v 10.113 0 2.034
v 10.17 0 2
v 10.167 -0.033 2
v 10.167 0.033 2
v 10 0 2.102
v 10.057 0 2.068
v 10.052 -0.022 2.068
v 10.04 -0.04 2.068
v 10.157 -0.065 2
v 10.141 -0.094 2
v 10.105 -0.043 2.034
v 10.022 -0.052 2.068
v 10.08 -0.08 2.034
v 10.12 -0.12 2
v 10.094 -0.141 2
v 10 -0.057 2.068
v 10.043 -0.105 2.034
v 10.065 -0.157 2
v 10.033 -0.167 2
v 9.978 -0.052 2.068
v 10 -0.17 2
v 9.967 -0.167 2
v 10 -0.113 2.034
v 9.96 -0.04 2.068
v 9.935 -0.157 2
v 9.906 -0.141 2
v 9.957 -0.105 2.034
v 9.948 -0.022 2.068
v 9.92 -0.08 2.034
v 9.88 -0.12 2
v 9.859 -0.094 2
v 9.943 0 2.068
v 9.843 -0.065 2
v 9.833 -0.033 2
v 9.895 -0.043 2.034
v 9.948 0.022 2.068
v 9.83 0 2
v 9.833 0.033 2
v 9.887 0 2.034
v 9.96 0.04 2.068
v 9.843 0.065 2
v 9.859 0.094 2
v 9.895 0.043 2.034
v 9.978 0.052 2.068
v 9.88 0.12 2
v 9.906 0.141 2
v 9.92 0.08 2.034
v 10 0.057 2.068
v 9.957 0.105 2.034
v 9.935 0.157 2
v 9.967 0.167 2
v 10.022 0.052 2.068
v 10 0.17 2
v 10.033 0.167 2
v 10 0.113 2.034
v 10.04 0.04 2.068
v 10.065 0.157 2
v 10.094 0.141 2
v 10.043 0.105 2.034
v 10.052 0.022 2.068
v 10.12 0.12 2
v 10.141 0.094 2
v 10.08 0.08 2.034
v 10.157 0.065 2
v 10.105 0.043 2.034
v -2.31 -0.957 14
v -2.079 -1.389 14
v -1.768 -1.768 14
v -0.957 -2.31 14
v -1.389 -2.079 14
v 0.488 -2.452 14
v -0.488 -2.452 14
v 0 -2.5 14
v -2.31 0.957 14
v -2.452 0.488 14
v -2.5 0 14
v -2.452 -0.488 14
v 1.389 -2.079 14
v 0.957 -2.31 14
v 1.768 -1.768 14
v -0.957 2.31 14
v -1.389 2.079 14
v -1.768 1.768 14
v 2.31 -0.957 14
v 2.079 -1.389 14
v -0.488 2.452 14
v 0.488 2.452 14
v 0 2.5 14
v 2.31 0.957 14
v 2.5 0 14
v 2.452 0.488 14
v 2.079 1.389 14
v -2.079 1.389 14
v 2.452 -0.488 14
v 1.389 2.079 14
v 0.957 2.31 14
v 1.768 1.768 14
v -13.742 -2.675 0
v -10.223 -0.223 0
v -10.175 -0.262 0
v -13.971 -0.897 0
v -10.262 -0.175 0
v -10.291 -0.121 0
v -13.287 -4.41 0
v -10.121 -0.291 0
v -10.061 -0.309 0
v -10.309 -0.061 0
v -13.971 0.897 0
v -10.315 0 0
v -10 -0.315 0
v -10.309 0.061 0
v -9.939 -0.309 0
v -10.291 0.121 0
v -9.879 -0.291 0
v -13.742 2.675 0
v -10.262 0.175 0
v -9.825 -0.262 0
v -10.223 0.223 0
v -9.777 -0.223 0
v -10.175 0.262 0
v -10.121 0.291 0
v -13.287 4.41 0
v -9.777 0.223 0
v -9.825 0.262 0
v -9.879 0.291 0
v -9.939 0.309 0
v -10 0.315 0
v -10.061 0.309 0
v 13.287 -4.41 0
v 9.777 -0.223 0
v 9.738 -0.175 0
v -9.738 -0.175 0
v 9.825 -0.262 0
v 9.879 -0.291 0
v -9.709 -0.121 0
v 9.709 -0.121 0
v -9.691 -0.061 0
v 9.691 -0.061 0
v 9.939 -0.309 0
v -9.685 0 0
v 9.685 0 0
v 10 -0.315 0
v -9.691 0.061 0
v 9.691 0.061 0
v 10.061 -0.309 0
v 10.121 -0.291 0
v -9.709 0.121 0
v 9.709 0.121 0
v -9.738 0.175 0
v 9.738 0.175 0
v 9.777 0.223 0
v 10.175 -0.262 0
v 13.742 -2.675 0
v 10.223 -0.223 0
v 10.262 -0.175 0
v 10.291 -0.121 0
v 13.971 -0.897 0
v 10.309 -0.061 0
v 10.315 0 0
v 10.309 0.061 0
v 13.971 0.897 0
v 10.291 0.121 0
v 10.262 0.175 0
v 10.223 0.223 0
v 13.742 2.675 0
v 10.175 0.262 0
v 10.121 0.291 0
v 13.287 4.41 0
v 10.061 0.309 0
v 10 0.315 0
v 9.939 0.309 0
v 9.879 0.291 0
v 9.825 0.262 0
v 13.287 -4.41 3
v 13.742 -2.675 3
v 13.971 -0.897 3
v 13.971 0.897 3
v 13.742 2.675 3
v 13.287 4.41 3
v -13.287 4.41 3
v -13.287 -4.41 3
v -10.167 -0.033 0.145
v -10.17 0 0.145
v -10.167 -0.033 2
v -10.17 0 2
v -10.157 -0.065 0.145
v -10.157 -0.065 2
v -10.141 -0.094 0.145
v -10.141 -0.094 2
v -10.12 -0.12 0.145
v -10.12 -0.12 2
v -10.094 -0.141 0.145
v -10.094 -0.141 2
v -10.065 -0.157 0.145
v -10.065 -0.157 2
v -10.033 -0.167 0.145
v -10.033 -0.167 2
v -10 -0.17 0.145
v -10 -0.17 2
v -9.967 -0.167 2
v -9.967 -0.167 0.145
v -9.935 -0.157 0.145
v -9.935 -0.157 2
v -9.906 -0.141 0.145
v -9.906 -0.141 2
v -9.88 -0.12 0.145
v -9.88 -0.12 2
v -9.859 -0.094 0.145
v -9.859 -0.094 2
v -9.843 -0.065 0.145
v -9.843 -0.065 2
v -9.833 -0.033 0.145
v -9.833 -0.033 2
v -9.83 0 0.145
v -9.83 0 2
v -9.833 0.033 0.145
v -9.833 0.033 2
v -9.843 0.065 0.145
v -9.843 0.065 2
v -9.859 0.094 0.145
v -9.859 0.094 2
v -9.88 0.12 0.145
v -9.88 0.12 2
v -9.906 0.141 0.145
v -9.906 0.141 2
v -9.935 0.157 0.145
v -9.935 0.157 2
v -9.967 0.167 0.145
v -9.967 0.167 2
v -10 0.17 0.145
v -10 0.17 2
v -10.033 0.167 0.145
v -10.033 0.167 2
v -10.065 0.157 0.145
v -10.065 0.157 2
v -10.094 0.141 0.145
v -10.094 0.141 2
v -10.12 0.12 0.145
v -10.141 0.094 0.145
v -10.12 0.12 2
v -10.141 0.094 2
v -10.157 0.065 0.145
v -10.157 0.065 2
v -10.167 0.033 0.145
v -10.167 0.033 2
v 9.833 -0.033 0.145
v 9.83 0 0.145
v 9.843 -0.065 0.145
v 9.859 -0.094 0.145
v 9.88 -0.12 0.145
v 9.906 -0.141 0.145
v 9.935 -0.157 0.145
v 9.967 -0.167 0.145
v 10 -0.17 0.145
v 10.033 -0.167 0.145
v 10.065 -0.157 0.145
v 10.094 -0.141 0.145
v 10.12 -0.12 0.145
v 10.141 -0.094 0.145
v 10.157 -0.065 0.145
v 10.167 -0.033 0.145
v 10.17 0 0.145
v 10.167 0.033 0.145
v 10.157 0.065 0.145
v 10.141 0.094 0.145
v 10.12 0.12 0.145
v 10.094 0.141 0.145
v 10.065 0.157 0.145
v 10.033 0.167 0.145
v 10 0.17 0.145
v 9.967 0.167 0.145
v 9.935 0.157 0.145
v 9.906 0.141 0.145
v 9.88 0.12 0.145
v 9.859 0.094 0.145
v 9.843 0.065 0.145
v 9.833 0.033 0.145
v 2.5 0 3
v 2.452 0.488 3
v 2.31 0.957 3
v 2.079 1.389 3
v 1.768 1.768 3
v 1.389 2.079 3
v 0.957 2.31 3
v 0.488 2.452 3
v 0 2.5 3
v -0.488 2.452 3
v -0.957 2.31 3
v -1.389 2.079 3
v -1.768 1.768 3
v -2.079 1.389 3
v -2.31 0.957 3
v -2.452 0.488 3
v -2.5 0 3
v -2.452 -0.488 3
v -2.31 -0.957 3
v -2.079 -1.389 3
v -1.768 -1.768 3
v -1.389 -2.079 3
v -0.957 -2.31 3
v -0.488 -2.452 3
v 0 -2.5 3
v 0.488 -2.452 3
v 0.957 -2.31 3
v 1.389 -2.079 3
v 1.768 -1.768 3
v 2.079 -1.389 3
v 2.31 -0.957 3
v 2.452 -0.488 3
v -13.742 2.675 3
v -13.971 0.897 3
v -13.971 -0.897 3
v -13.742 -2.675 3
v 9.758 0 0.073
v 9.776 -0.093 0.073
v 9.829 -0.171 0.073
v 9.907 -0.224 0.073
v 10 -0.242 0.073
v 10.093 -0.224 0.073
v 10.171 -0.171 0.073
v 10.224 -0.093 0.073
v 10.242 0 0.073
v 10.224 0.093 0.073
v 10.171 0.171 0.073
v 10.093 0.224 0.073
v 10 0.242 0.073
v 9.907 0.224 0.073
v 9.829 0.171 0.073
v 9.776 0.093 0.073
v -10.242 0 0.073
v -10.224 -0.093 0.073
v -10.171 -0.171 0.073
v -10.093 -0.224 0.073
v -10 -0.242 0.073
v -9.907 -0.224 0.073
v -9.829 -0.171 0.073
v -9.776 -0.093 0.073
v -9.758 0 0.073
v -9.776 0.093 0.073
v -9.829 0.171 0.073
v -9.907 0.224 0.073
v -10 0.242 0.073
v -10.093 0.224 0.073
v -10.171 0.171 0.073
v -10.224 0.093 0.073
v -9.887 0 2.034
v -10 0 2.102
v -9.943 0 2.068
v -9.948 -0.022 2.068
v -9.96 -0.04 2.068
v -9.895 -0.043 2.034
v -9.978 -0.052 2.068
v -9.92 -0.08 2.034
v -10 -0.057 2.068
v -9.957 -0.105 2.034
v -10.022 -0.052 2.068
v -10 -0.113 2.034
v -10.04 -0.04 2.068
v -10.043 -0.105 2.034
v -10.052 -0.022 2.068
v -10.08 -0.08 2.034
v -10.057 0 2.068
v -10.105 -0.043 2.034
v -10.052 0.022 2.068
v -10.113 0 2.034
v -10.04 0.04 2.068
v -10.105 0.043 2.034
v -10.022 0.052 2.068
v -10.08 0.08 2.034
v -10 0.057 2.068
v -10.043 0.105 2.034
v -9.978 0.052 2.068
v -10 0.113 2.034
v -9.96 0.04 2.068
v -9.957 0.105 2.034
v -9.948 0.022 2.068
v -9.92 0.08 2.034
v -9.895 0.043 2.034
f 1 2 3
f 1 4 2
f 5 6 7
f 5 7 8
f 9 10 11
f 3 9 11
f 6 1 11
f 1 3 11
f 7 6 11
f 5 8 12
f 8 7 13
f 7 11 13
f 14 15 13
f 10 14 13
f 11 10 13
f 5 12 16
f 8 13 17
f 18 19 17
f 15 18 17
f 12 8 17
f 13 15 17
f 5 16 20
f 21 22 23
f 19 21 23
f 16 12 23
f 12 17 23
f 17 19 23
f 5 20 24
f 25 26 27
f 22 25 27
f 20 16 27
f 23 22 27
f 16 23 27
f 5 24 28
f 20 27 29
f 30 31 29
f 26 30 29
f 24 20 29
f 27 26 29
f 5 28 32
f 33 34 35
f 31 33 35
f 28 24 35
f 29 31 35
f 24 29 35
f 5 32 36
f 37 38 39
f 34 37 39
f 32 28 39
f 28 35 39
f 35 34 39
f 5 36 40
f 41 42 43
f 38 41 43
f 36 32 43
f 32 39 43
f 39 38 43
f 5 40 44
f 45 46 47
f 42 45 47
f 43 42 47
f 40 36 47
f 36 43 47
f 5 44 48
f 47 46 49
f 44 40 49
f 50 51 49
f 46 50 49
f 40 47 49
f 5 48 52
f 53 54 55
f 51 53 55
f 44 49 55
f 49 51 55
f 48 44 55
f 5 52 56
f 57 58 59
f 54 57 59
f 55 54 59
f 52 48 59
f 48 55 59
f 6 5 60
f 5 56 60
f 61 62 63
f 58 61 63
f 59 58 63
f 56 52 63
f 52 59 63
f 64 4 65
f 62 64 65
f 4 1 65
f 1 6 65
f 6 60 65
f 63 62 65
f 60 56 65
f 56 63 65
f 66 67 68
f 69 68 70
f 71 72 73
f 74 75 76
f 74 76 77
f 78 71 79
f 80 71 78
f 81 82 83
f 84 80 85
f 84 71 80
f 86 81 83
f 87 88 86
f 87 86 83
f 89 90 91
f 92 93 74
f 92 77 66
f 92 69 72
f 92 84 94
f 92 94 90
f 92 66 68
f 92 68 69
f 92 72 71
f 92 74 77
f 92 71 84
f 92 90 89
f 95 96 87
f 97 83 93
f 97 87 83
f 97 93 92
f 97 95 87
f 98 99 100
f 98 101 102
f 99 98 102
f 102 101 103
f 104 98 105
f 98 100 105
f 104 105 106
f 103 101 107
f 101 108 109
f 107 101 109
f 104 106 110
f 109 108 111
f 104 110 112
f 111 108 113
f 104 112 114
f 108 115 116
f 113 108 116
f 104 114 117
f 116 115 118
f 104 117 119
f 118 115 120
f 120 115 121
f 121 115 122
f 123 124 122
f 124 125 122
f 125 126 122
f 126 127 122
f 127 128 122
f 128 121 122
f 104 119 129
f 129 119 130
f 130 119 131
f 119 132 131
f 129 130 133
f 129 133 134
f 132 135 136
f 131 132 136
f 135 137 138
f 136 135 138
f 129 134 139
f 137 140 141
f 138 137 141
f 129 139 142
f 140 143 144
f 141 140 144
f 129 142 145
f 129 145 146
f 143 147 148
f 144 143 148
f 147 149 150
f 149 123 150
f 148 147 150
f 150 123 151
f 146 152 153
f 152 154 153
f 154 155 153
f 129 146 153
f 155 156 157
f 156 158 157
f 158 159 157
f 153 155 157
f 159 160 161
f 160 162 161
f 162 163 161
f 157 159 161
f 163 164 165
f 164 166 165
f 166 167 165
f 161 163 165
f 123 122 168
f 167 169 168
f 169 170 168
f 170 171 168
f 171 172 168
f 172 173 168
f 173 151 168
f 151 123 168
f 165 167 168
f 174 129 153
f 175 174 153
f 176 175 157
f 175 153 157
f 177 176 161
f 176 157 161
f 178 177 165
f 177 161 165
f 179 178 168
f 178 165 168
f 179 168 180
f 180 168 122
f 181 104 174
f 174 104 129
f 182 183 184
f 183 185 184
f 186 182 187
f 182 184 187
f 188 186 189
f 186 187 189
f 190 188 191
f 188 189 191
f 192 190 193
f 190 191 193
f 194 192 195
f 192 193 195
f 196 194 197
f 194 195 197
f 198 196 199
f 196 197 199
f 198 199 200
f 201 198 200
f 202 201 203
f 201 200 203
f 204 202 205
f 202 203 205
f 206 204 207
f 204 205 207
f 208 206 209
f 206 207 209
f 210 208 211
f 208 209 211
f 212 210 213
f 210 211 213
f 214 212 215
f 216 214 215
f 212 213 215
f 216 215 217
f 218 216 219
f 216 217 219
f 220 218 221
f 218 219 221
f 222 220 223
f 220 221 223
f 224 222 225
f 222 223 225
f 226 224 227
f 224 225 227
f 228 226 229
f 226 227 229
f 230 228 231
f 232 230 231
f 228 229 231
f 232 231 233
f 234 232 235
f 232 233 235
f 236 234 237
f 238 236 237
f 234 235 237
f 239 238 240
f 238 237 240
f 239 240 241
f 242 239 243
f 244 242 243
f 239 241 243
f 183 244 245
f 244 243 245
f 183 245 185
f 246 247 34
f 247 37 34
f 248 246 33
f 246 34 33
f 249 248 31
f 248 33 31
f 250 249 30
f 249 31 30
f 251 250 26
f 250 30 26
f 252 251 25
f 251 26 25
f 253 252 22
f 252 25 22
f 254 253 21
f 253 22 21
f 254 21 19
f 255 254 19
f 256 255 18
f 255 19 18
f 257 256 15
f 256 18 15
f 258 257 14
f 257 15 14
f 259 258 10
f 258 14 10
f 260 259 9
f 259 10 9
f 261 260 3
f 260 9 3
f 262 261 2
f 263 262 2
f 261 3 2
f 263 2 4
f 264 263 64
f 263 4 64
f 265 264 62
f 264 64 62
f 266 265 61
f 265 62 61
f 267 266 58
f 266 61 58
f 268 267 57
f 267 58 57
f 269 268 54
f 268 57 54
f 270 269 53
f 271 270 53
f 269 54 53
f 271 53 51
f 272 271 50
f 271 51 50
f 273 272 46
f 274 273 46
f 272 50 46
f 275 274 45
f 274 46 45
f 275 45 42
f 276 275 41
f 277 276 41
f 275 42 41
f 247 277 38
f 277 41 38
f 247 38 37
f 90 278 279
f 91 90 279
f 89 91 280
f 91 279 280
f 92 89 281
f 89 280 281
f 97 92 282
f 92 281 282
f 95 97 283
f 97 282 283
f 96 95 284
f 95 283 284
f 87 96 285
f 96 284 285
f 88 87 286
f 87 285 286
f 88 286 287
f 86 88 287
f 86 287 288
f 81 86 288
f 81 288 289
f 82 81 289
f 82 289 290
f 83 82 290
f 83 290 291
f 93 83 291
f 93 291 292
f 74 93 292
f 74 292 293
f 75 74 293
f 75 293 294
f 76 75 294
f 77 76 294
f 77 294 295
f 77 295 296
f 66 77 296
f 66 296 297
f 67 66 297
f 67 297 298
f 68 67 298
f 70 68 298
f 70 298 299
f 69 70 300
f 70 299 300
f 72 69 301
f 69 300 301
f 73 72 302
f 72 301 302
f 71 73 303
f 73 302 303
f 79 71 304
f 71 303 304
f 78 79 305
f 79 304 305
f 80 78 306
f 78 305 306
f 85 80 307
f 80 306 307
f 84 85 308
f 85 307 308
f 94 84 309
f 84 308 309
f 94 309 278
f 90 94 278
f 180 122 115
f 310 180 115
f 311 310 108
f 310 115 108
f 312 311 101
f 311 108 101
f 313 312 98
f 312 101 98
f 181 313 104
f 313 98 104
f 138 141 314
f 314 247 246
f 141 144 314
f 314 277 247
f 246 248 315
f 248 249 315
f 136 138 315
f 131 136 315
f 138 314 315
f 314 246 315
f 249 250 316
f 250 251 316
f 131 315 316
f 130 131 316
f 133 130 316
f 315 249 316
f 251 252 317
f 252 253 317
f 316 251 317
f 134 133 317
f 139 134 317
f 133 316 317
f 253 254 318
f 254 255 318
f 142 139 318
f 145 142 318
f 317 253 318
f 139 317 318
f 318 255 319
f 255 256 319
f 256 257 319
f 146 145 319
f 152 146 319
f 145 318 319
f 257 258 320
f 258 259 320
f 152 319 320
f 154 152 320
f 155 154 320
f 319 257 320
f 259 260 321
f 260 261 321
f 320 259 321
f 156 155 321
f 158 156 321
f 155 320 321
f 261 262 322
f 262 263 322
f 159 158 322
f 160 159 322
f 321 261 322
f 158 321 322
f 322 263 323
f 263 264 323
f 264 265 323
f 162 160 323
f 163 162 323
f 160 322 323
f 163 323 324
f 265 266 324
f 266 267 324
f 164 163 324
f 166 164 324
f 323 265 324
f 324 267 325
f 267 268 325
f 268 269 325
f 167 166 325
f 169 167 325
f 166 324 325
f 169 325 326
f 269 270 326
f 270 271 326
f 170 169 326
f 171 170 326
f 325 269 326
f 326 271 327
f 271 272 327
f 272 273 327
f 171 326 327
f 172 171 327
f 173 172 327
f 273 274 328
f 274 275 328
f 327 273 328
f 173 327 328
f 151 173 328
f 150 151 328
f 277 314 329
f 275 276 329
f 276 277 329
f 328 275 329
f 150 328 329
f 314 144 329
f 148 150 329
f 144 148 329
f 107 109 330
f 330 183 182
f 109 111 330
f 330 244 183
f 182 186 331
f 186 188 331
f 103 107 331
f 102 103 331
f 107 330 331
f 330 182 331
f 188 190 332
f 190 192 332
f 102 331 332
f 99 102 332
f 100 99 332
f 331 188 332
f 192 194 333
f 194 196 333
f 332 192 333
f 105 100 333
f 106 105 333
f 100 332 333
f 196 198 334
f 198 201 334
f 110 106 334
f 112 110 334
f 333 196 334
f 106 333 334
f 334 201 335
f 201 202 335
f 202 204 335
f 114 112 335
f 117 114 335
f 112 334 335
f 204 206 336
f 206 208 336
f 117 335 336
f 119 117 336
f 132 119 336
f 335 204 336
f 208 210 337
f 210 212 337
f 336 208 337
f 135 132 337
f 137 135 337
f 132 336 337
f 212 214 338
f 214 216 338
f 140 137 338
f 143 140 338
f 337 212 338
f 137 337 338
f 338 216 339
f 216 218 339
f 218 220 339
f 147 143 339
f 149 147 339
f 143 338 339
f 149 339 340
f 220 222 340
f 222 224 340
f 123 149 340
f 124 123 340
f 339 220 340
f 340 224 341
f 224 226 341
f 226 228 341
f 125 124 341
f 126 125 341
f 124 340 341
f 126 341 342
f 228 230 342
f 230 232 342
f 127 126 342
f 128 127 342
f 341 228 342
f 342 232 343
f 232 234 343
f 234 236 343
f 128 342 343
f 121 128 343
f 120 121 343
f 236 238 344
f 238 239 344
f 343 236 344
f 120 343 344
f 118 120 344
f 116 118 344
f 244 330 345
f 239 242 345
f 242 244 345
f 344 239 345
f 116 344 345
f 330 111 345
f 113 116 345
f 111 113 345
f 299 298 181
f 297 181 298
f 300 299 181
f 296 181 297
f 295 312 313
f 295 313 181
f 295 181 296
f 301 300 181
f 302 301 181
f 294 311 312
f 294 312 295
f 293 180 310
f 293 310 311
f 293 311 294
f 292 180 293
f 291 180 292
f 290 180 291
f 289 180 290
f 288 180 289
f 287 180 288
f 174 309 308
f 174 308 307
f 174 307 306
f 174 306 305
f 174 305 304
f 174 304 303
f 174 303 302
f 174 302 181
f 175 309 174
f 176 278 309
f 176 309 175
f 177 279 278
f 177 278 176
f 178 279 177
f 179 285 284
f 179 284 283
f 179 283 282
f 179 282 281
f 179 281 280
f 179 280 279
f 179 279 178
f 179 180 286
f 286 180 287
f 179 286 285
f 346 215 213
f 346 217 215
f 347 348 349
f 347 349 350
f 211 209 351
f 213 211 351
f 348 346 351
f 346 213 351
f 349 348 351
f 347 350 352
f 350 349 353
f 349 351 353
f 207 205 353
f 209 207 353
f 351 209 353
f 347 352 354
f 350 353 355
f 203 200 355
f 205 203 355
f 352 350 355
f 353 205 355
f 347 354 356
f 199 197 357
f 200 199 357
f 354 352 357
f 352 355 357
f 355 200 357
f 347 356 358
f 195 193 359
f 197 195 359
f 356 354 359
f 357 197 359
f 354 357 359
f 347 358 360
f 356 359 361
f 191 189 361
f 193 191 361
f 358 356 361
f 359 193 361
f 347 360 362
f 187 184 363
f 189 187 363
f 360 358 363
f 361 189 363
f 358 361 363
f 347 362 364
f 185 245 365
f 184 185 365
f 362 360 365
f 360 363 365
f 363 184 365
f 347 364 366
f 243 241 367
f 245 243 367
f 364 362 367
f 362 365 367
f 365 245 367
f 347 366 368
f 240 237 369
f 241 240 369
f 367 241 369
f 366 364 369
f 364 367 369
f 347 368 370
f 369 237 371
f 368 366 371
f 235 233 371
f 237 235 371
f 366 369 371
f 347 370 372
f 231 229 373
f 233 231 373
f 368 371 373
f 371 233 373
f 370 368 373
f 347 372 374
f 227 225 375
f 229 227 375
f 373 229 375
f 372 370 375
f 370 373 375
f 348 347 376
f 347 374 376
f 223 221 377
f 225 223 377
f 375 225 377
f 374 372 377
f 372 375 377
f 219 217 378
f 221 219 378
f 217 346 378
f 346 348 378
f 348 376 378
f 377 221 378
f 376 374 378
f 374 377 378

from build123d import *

# Parameters (mm, degrees)
F1_DEPTH       = 3
F2_D           = 0.34
F2_DEPTH       = 2
F2_CSINK_D     = 0.63
F2_CSINK_ANGLE = 90
F2_TIP         = 0.1021463052
F5_R           = 2.5
F6_DEPTH       = 14


# Not quite as in the source:
# - the program builds the solid bodies; features that only make, move or delete a surface that nothing else refers to are left out


with BuildPart() as f1:
    # F0 (on Top) → F1 (new body)
    with BuildSketch(Plane.XY):
        with BuildLine():
            Line((13.2871780876, 4.4103172753), (-13.2871780876, 4.4103172753))
            ThreePointArc((-13.2871780876, 4.4103172753), (-14, 0), (-13.2871780876, -4.4103172753))
            Line((-13.2871780876, -4.4103172753), (13.2871780876, -4.4103172753))
            ThreePointArc((13.2871780876, -4.4103172753), (14, 0), (13.2871780876, 4.4103172753))
        make_face()
    extrude(amount=F1_DEPTH)

    # F2
    with Locations(Plane(origin=(0, 0, 0), x_dir=(1, 0, 0), z_dir=(0, 0, -1))):
        with Locations((-10, 0), (10, 0)):
            CounterSinkHole(F2_D / 2, F2_CSINK_D / 2, depth=F2_DEPTH, counter_sink_angle=F2_CSINK_ANGLE)
            with Locations((0, 0, -(F2_DEPTH + F2_TIP / 2))):  # 118° drill point
                Cone(0, F2_D / 2, F2_TIP, mode=Mode.SUBTRACT)

    # F5 (on Top) → F6 (join)
    with BuildSketch(Plane.XY):
        Circle(F5_R)
    extrude(amount=F6_DEPTH)


solid = f1.part
